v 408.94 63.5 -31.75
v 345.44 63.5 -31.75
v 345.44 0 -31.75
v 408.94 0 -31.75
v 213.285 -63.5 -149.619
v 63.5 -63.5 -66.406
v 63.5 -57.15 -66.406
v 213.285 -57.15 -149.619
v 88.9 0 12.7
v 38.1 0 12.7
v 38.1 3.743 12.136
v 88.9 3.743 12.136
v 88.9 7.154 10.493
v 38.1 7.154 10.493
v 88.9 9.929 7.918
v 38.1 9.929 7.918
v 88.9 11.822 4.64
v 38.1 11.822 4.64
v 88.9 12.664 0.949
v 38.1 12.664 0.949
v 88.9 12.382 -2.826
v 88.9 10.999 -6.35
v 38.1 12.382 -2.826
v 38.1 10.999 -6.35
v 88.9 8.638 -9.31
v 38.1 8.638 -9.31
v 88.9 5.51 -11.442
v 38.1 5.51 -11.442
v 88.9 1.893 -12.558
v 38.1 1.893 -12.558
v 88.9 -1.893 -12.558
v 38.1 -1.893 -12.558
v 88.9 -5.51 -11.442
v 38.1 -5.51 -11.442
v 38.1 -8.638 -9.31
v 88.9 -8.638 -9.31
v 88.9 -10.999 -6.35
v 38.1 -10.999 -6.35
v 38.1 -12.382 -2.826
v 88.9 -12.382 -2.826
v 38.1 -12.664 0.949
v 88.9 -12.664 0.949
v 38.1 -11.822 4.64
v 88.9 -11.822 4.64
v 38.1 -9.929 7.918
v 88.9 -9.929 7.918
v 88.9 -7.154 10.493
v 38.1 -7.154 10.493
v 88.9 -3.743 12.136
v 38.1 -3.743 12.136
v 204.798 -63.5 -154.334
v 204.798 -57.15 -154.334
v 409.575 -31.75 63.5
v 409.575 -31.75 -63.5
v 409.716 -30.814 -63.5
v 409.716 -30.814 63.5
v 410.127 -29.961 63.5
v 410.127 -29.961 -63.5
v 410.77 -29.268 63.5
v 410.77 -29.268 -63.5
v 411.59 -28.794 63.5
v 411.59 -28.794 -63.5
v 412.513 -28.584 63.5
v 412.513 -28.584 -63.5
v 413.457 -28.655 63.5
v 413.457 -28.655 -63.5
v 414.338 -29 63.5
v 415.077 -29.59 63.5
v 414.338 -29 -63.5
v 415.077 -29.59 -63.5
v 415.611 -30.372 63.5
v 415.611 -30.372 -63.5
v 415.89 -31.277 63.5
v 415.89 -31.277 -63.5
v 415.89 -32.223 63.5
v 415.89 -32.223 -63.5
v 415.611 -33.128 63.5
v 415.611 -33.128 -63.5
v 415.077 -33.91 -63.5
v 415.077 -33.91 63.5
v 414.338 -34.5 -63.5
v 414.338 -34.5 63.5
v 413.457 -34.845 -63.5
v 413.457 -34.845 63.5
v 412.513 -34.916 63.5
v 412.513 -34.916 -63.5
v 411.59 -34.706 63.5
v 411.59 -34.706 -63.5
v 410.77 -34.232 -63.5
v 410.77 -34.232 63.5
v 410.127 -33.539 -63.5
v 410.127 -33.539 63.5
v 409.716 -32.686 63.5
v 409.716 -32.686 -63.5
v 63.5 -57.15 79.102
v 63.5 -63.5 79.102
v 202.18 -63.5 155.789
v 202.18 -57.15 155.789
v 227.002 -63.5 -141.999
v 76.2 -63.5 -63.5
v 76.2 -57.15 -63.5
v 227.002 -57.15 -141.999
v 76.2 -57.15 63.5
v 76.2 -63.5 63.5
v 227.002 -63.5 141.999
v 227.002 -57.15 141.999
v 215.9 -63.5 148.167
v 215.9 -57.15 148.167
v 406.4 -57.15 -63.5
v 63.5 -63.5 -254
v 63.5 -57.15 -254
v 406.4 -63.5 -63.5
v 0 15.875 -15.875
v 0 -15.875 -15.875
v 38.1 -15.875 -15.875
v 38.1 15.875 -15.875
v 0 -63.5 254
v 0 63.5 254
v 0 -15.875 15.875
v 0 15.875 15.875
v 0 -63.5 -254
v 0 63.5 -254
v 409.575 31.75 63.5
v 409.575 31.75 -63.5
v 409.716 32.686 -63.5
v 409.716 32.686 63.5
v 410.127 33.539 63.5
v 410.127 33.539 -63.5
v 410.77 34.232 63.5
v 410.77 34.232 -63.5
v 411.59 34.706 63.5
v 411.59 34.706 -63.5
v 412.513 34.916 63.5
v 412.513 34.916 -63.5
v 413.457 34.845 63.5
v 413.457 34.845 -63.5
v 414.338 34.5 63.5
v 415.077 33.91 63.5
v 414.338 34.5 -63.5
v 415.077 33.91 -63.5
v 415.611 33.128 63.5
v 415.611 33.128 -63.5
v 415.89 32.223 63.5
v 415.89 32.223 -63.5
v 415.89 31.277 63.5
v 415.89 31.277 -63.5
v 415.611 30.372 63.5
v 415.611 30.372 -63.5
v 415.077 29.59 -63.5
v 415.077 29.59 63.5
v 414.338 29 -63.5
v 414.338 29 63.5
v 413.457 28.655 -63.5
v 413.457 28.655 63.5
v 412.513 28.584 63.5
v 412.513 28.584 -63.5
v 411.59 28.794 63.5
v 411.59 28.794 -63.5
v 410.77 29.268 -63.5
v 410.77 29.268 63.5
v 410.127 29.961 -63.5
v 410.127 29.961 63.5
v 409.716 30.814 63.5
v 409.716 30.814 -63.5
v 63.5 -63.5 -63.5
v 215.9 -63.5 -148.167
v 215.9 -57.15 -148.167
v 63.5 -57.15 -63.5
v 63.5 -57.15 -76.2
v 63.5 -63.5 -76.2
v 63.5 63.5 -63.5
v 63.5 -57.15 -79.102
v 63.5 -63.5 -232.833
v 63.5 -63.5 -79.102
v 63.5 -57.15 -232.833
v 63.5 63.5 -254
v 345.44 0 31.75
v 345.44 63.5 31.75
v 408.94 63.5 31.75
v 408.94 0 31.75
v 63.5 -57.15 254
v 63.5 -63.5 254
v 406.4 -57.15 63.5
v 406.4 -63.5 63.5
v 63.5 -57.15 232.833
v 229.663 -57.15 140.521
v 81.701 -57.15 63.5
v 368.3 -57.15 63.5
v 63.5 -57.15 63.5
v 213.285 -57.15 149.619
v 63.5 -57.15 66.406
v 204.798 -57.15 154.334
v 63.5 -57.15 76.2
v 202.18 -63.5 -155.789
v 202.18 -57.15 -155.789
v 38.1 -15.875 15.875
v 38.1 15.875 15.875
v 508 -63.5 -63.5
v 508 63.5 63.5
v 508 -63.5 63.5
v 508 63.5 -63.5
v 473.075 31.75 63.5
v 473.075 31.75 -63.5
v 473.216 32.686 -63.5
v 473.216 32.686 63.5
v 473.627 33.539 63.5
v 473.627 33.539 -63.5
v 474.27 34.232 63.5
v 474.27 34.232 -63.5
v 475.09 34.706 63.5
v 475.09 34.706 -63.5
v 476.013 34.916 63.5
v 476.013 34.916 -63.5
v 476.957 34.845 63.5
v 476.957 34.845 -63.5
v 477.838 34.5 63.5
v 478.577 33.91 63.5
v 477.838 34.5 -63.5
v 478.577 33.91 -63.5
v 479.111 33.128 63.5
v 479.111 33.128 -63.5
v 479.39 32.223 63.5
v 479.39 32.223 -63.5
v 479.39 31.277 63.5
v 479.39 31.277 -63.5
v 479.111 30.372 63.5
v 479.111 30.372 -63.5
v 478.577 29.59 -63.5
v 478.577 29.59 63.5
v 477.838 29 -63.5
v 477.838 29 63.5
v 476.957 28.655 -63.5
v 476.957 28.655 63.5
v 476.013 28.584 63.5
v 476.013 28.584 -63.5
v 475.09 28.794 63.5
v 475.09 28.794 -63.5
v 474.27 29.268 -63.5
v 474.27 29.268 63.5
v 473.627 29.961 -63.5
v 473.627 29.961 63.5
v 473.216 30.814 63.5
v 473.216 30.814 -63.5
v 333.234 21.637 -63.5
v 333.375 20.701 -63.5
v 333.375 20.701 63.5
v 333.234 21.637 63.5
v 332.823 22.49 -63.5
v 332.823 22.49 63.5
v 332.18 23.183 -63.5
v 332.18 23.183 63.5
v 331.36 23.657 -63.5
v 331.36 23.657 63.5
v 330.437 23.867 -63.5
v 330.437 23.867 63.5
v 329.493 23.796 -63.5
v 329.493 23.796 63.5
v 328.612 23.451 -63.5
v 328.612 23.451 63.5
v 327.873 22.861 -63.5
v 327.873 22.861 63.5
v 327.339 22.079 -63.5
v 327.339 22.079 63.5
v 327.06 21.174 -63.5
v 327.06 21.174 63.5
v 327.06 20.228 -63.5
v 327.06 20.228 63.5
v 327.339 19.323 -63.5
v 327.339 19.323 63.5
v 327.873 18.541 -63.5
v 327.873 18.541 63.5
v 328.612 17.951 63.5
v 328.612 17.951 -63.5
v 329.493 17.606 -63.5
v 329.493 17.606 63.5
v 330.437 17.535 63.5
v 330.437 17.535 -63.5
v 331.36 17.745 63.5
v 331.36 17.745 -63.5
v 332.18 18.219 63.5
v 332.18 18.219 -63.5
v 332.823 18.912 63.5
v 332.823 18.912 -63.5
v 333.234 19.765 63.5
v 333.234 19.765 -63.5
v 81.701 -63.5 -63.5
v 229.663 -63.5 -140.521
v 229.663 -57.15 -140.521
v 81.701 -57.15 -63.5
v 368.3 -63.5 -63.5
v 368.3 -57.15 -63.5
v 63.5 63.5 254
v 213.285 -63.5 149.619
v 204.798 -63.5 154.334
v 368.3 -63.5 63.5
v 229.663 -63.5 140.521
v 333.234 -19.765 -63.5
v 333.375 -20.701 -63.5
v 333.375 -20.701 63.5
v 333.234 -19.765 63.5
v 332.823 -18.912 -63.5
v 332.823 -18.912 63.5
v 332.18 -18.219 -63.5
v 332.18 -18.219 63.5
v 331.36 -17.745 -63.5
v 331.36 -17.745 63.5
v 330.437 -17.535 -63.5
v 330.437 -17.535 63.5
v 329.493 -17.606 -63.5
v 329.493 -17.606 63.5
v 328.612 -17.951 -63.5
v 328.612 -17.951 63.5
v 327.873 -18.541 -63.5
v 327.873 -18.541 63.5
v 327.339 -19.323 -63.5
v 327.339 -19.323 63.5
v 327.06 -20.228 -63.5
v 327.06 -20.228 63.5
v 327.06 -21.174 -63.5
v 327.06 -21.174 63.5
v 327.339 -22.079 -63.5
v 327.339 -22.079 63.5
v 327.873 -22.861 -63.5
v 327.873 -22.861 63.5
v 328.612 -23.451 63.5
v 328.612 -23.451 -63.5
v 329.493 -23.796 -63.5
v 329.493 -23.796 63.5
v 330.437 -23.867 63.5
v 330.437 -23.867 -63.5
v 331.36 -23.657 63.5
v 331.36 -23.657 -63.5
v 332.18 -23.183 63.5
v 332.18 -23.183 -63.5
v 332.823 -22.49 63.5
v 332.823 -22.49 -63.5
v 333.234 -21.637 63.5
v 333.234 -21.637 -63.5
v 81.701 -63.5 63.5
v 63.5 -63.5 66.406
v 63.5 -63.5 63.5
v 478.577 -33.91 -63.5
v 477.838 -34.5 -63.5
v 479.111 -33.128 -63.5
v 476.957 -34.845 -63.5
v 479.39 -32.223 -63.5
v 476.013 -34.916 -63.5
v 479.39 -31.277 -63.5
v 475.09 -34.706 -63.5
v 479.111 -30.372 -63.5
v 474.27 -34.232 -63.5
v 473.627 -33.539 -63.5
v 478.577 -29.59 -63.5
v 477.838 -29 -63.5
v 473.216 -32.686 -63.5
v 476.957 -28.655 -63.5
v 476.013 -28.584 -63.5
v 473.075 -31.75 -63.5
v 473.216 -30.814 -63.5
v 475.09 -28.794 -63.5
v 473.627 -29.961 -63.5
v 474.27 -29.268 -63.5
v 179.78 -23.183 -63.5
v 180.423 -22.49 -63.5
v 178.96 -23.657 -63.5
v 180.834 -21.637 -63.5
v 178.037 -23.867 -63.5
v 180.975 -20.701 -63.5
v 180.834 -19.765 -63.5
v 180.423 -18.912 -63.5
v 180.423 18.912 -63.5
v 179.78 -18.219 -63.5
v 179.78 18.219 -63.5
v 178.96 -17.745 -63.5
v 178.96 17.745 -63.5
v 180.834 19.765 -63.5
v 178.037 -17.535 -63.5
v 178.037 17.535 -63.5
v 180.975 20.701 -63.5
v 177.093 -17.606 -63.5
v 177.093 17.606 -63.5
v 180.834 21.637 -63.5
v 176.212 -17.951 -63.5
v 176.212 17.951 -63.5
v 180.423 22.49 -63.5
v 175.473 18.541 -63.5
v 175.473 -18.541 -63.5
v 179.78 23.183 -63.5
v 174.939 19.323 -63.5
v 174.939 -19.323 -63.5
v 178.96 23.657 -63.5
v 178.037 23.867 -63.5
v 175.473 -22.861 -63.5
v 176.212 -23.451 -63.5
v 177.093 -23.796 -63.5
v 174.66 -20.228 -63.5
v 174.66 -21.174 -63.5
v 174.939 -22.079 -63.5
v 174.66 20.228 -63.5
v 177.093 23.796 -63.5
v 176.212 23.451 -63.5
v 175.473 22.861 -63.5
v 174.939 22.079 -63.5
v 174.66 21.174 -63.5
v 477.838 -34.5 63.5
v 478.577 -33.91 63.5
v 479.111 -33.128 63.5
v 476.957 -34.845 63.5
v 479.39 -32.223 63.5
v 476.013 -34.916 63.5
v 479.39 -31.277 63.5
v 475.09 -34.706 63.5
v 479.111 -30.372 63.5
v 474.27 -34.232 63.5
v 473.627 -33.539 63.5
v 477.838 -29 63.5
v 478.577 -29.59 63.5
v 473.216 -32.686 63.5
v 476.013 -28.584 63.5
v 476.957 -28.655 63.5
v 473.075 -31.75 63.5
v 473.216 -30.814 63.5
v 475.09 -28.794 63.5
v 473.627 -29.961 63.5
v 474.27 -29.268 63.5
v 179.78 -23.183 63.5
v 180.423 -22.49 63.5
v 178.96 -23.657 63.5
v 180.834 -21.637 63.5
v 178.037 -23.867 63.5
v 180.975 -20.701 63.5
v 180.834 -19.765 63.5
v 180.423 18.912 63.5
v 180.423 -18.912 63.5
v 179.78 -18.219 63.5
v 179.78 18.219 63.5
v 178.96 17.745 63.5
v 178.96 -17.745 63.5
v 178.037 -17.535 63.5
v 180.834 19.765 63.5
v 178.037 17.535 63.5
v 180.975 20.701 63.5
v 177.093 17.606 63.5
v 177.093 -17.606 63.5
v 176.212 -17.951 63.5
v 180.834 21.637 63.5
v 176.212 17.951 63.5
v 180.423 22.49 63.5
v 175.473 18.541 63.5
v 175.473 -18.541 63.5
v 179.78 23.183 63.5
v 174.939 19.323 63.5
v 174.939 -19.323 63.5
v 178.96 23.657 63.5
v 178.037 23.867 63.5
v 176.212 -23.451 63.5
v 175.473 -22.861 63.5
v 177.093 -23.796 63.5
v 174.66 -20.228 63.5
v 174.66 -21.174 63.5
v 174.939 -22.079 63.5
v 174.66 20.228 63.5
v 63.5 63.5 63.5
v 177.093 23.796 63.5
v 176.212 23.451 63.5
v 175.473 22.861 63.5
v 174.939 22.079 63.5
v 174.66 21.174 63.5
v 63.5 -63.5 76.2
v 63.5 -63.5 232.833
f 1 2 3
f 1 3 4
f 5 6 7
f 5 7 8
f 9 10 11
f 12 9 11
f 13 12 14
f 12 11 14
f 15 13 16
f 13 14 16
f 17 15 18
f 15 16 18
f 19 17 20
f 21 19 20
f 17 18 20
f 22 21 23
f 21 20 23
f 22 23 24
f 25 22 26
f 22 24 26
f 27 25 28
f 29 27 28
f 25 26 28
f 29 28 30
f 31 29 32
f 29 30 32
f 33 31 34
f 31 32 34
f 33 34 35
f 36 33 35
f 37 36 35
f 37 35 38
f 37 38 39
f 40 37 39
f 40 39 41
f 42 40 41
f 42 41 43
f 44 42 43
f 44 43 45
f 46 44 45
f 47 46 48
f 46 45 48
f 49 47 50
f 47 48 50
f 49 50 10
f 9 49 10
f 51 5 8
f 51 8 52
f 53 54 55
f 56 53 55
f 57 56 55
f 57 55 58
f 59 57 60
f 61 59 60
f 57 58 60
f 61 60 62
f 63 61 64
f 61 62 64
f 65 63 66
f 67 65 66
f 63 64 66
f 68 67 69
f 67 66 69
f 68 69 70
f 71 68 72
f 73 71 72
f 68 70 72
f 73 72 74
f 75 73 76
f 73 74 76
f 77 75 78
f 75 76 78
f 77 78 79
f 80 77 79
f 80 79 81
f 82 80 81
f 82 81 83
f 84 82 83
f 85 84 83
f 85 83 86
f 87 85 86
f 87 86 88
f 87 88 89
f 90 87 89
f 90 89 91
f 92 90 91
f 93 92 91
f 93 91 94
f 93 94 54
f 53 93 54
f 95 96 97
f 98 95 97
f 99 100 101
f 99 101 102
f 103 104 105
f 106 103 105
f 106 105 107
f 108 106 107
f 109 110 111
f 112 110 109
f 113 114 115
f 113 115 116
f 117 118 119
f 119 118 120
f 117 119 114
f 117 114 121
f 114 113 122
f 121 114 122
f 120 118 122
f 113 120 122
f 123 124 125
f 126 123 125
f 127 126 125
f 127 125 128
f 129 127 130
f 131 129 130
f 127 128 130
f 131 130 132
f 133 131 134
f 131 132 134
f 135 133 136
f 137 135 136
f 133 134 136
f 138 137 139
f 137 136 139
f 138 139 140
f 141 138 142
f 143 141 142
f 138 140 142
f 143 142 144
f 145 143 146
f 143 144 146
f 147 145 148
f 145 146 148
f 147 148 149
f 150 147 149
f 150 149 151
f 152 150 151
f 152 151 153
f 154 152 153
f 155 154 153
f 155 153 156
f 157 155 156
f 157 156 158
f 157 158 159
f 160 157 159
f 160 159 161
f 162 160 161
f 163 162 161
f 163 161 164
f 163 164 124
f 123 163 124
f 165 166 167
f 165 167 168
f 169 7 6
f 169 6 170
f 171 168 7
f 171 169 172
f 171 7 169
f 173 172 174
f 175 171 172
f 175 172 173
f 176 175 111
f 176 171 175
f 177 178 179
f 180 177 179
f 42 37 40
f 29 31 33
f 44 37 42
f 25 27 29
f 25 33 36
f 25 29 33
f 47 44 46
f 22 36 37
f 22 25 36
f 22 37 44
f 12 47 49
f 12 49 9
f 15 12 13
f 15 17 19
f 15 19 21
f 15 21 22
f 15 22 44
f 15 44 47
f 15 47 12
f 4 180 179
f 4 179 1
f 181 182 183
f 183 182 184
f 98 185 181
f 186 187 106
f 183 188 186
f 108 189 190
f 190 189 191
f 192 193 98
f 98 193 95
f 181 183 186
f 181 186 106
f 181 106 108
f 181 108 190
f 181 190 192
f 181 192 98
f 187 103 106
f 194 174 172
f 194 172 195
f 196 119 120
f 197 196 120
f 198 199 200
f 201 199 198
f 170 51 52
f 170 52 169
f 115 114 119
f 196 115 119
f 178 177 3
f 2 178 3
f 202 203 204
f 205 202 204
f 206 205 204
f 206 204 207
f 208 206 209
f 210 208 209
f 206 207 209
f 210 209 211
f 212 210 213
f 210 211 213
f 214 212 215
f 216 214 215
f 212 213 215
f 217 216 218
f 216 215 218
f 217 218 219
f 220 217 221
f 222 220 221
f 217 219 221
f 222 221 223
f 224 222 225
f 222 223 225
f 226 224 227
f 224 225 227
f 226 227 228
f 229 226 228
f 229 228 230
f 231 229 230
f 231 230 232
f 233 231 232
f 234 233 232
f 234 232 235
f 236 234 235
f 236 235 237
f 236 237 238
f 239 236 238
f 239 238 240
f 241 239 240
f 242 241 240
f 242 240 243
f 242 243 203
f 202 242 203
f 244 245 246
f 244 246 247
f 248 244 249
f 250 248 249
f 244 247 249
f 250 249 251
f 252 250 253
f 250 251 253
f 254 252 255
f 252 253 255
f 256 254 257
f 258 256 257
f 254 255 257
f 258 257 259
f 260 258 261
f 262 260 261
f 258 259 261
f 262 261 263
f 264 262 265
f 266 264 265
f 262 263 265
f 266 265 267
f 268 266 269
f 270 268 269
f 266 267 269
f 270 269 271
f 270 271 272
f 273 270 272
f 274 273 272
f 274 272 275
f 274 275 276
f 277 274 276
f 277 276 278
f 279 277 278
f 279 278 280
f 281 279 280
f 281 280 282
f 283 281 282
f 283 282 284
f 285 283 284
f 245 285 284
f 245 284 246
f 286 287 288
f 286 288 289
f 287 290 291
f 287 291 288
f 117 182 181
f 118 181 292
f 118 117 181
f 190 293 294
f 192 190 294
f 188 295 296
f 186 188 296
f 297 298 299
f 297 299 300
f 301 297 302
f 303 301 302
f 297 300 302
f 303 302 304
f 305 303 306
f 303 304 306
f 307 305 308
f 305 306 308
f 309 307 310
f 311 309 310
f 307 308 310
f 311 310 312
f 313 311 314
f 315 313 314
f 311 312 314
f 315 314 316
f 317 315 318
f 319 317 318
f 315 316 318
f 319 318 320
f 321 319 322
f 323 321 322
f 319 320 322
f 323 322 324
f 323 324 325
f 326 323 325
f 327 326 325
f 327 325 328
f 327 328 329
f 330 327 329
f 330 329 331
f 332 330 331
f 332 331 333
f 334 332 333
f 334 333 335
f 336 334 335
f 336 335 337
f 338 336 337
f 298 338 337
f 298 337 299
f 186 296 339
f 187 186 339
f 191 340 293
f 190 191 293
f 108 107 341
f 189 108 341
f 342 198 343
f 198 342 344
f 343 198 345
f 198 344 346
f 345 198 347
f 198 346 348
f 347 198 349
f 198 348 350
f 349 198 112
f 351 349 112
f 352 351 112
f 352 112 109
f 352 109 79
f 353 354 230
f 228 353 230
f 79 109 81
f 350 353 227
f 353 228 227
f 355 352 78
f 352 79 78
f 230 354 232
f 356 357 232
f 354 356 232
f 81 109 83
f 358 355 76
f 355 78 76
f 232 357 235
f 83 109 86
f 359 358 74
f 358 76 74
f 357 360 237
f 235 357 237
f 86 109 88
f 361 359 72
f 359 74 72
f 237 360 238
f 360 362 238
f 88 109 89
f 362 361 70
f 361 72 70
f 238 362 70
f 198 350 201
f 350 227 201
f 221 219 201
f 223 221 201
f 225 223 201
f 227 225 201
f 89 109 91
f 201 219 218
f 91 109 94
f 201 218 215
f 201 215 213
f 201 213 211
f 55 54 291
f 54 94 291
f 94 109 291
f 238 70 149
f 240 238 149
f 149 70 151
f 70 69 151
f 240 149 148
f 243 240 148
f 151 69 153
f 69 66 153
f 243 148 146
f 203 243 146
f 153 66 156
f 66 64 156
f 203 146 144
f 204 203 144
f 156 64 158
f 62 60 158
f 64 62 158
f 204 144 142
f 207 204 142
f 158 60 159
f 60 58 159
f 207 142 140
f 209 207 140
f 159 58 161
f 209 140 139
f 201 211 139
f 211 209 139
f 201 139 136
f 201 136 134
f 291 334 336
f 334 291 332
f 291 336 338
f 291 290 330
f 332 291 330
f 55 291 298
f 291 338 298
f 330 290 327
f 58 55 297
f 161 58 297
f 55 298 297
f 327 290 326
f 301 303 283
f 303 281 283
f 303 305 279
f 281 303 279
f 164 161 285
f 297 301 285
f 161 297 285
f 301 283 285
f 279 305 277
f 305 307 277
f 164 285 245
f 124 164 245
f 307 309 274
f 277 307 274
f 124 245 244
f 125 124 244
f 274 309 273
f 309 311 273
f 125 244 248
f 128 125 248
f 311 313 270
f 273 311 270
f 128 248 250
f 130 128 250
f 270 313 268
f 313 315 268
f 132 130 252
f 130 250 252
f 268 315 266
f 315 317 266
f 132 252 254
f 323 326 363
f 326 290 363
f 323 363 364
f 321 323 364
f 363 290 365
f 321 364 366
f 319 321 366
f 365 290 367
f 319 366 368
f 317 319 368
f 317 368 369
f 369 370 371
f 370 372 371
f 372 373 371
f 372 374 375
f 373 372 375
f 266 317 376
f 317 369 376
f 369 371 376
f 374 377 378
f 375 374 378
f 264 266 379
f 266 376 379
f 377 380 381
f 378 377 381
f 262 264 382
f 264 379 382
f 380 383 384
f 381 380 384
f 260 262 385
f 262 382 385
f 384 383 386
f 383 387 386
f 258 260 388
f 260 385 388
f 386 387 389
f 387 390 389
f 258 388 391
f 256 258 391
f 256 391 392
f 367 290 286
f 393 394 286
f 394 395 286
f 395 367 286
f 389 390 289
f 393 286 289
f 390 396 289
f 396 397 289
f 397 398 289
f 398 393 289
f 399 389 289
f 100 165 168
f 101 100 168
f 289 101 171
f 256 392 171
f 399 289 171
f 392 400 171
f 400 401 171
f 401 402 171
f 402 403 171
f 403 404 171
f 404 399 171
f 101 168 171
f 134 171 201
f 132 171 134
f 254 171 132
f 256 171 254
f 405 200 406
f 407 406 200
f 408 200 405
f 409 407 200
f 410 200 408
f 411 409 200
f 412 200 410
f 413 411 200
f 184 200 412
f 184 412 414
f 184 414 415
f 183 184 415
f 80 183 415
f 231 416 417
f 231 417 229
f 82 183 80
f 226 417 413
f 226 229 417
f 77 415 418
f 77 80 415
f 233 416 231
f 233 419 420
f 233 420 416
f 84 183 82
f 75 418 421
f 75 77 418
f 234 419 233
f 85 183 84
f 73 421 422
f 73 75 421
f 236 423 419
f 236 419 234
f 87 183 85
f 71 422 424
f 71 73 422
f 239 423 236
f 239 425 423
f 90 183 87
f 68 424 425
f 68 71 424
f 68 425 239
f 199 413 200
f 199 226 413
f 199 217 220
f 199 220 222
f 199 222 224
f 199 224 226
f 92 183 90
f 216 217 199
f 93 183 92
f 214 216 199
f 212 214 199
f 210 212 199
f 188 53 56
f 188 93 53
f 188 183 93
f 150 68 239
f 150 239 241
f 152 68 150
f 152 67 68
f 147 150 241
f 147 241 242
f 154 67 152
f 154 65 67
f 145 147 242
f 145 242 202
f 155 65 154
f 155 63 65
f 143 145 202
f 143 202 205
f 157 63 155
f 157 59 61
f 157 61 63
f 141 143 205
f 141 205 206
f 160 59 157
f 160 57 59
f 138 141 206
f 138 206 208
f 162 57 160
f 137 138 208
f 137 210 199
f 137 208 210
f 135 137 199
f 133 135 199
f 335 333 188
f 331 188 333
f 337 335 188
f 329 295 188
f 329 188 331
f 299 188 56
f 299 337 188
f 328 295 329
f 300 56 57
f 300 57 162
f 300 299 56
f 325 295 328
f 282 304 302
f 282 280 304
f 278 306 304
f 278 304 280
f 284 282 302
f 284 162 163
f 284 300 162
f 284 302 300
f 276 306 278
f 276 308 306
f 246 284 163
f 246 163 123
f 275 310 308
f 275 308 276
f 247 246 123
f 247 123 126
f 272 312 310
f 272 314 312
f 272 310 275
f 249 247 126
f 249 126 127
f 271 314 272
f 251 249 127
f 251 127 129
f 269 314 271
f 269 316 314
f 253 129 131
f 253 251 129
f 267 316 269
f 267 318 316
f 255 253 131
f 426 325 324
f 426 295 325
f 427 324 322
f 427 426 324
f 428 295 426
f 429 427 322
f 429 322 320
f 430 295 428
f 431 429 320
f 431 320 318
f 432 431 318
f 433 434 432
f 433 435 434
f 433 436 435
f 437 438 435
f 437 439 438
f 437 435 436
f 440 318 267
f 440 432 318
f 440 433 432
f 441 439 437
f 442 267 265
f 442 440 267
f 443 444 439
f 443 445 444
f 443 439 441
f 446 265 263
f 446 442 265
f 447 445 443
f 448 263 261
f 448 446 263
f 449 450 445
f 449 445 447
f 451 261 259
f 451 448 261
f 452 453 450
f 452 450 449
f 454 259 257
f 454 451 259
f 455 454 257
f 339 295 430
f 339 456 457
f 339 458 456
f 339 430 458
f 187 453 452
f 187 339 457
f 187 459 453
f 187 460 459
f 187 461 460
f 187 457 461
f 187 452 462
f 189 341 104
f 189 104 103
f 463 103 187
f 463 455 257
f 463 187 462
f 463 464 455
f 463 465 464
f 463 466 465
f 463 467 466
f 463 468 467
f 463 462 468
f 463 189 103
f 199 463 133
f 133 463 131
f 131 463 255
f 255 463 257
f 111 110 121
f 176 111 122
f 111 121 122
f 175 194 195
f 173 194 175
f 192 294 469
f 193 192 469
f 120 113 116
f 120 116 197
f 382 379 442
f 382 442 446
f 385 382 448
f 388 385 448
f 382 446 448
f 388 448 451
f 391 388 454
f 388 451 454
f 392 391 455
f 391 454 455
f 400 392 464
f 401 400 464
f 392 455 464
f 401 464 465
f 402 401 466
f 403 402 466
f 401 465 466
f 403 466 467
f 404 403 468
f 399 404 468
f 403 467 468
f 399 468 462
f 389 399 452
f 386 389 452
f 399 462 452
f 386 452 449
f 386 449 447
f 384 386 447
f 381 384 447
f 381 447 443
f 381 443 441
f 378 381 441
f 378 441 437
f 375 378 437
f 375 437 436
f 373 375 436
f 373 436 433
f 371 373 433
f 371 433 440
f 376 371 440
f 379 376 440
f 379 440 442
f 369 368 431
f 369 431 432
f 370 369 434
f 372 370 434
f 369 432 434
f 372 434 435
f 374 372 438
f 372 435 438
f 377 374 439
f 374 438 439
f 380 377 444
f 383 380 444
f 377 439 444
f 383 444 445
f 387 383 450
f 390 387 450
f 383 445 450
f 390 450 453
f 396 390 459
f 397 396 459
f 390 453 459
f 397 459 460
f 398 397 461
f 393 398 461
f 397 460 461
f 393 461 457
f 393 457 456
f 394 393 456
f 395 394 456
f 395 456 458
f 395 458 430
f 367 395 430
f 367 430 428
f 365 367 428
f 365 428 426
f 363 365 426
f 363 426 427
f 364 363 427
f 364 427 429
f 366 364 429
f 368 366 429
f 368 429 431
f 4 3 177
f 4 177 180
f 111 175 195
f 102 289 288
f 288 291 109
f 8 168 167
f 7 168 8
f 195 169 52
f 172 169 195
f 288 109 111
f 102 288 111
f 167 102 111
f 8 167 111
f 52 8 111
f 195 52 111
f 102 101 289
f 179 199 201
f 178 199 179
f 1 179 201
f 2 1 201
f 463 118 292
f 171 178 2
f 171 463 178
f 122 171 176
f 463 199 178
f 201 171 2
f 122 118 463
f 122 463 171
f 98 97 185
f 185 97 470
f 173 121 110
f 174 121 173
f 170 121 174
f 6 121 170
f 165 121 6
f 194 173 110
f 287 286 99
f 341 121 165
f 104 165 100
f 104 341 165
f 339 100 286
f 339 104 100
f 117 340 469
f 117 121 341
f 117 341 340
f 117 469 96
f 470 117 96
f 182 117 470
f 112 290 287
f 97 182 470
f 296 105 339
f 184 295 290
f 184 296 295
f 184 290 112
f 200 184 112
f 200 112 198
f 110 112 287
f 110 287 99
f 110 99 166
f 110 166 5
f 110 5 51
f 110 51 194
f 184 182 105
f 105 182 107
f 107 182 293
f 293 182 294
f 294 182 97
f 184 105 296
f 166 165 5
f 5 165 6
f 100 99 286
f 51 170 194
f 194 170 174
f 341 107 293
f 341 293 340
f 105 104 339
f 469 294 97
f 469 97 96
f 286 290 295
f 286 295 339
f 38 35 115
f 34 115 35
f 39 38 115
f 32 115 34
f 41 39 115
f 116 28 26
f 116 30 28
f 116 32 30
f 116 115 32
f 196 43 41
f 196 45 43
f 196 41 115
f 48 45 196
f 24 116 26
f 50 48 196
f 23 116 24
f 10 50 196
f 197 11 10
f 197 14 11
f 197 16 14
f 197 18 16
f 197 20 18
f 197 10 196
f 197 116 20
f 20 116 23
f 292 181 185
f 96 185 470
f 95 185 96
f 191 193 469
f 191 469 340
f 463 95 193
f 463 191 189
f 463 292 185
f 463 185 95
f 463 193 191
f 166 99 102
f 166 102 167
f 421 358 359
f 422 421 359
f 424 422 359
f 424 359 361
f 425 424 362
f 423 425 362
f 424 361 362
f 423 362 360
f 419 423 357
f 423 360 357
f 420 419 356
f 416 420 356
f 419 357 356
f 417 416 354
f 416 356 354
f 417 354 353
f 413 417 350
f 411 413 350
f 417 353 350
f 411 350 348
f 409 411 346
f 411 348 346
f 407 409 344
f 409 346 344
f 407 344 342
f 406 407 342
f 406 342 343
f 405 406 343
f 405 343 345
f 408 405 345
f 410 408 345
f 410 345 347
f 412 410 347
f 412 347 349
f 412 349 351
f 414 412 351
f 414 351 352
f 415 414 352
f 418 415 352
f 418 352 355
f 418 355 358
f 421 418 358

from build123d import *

# Parameters (mm, degrees)
SKETCH2_W                   = 508
SKETCH2_H                   = 127
BOSS_EXTRUDE1_DEPTH         = 63.5
SKETCH3_W                   = 127
SKETCH3_H                   = 127
BOSS_EXTRUDE2_DEPTH         = 444.5
SKETCH4_W                   = 31.75
SKETCH4_H                   = 31.75
CUT_EXTRUDE1_DEPTH          = 38.1
SKETCH5_R                   = 12.7
CUT_EXTRUDE2_DEPTH          = 50.8
SKETCH6_W                   = 63.5
SKETCH6_H                   = 63.5
CUT_EXTRUDE3_DEPTH          = 63.5
F_1_4_0_25_DIAMETER_HOLE1_D = 6.35
BOSS_EXTRUDE3_DEPTH         = 6.35
EXTRUDE_THIN1_START         = -6.35
EXTRUDE_THIN1_DEPTH         = 6.35
SKETCH12_R                  = 3.175
CUT_EXTRUDE4_DEPTH          = 603.413894262


# Read off the part's stored shape, not the designer's step: Extrude-Thin1
with BuildPart() as part:
    # Sketch2 → Boss-Extrude1 (new body)
    with BuildSketch(Plane(origin=(0, 0, 0), x_dir=(0, 0, -1), z_dir=(1, 0, 0))):
        Rectangle(SKETCH2_W, SKETCH2_H)
    extrude(amount=BOSS_EXTRUDE1_DEPTH)

    # Sketch3 → Boss-Extrude2 (add)
    with BuildSketch(Plane(origin=(63.5, 0, 0), x_dir=(0, 0, -1), z_dir=(1, 0, 0))):
        Rectangle(SKETCH3_W, SKETCH3_H)
    extrude(amount=BOSS_EXTRUDE2_DEPTH)

    # Sketch4 → Cut-Extrude1 (cut)
    with BuildSketch(Plane.ZY):
        Rectangle(SKETCH4_W, SKETCH4_H)
    extrude(amount=-CUT_EXTRUDE1_DEPTH, mode=Mode.SUBTRACT)

    # Sketch5 → Cut-Extrude2 (cut)
    with BuildSketch(Plane.ZY.offset(-38.1)):
        Circle(SKETCH5_R)
    extrude(amount=-CUT_EXTRUDE2_DEPTH, mode=Mode.SUBTRACT)

    # Sketch6 → Cut-Extrude3 (cut)
    with BuildSketch(Plane(origin=(0, 63.5, 0), x_dir=(1, 0, 0), z_dir=(0, 1, 0))):
        with Locations((377.19, 0)):
            Rectangle(SKETCH6_W, SKETCH6_H)
    extrude(amount=-CUT_EXTRUDE3_DEPTH, mode=Mode.SUBTRACT)

    # 1/4 (0.25) Diameter Hole1 (through all)
    with Locations(Plane.XY.offset(63.5)):
        with Locations((476.25, -31.75), (412.75, -31.75), (412.75, 31.75), (476.25, 31.75)):
            Hole(F_1_4_0_25_DIAMETER_HOLE1_D / 2)

    # Sketch10 → Boss-Extrude3 (add)
    with BuildSketch(Plane.XZ.offset(63.5)):
        Polygon((63.5, 254), (406.4, 63.5), (368.3, 63.5), (63.5, 232.833333333), align=None)
    boss_extrude3 = extrude(amount=-BOSS_EXTRUDE3_DEPTH)

    # Mirror1: Boss-Extrude3 across plane
    add(boss_extrude3.mirror(Plane.XY))

    # Extrude-Thin1 outline → Extrude-Thin1 (add)
    with BuildSketch(Plane(origin=(0, -57.15, 0), x_dir=(1, 0, 0), z_dir=(0, 1, 0)).offset(EXTRUDE_THIN1_START)):
        Polygon((81.701018612, -63.5), (76.2, -63.5), (227.001797407, -141.999001441), (229.66281775, -140.520656806), align=None)
        Polygon((215.9, -148.166666667), (63.5, -63.5), (63.5, -66.405655618), (213.284909944, -149.619494475), align=None)
        Polygon((204.798202593, -154.334331893), (63.5, -76.2), (63.5, -79.10247771), (202.17989093, -155.788949483), align=None)
    extrude_thin1 = extrude(amount=EXTRUDE_THIN1_DEPTH)

    # Mirror2: Extrude-Thin1 across plane
    add(extrude_thin1.mirror(Plane.XY))

    # Sketch12 → Cut-Extrude4 (cut, through all)
    with BuildSketch(Plane.XY.offset(63.5)):
        with Locations((177.8, 20.701)):
            Circle(SKETCH12_R)
        with Locations((177.8, -20.701)):
            Circle(SKETCH12_R)
        with Locations((330.2, 20.701)):
            Circle(SKETCH12_R)
        with Locations((330.2, -20.701)):
            Circle(SKETCH12_R)
    extrude(amount=-CUT_EXTRUDE4_DEPTH, mode=Mode.SUBTRACT)


solid = part.part
